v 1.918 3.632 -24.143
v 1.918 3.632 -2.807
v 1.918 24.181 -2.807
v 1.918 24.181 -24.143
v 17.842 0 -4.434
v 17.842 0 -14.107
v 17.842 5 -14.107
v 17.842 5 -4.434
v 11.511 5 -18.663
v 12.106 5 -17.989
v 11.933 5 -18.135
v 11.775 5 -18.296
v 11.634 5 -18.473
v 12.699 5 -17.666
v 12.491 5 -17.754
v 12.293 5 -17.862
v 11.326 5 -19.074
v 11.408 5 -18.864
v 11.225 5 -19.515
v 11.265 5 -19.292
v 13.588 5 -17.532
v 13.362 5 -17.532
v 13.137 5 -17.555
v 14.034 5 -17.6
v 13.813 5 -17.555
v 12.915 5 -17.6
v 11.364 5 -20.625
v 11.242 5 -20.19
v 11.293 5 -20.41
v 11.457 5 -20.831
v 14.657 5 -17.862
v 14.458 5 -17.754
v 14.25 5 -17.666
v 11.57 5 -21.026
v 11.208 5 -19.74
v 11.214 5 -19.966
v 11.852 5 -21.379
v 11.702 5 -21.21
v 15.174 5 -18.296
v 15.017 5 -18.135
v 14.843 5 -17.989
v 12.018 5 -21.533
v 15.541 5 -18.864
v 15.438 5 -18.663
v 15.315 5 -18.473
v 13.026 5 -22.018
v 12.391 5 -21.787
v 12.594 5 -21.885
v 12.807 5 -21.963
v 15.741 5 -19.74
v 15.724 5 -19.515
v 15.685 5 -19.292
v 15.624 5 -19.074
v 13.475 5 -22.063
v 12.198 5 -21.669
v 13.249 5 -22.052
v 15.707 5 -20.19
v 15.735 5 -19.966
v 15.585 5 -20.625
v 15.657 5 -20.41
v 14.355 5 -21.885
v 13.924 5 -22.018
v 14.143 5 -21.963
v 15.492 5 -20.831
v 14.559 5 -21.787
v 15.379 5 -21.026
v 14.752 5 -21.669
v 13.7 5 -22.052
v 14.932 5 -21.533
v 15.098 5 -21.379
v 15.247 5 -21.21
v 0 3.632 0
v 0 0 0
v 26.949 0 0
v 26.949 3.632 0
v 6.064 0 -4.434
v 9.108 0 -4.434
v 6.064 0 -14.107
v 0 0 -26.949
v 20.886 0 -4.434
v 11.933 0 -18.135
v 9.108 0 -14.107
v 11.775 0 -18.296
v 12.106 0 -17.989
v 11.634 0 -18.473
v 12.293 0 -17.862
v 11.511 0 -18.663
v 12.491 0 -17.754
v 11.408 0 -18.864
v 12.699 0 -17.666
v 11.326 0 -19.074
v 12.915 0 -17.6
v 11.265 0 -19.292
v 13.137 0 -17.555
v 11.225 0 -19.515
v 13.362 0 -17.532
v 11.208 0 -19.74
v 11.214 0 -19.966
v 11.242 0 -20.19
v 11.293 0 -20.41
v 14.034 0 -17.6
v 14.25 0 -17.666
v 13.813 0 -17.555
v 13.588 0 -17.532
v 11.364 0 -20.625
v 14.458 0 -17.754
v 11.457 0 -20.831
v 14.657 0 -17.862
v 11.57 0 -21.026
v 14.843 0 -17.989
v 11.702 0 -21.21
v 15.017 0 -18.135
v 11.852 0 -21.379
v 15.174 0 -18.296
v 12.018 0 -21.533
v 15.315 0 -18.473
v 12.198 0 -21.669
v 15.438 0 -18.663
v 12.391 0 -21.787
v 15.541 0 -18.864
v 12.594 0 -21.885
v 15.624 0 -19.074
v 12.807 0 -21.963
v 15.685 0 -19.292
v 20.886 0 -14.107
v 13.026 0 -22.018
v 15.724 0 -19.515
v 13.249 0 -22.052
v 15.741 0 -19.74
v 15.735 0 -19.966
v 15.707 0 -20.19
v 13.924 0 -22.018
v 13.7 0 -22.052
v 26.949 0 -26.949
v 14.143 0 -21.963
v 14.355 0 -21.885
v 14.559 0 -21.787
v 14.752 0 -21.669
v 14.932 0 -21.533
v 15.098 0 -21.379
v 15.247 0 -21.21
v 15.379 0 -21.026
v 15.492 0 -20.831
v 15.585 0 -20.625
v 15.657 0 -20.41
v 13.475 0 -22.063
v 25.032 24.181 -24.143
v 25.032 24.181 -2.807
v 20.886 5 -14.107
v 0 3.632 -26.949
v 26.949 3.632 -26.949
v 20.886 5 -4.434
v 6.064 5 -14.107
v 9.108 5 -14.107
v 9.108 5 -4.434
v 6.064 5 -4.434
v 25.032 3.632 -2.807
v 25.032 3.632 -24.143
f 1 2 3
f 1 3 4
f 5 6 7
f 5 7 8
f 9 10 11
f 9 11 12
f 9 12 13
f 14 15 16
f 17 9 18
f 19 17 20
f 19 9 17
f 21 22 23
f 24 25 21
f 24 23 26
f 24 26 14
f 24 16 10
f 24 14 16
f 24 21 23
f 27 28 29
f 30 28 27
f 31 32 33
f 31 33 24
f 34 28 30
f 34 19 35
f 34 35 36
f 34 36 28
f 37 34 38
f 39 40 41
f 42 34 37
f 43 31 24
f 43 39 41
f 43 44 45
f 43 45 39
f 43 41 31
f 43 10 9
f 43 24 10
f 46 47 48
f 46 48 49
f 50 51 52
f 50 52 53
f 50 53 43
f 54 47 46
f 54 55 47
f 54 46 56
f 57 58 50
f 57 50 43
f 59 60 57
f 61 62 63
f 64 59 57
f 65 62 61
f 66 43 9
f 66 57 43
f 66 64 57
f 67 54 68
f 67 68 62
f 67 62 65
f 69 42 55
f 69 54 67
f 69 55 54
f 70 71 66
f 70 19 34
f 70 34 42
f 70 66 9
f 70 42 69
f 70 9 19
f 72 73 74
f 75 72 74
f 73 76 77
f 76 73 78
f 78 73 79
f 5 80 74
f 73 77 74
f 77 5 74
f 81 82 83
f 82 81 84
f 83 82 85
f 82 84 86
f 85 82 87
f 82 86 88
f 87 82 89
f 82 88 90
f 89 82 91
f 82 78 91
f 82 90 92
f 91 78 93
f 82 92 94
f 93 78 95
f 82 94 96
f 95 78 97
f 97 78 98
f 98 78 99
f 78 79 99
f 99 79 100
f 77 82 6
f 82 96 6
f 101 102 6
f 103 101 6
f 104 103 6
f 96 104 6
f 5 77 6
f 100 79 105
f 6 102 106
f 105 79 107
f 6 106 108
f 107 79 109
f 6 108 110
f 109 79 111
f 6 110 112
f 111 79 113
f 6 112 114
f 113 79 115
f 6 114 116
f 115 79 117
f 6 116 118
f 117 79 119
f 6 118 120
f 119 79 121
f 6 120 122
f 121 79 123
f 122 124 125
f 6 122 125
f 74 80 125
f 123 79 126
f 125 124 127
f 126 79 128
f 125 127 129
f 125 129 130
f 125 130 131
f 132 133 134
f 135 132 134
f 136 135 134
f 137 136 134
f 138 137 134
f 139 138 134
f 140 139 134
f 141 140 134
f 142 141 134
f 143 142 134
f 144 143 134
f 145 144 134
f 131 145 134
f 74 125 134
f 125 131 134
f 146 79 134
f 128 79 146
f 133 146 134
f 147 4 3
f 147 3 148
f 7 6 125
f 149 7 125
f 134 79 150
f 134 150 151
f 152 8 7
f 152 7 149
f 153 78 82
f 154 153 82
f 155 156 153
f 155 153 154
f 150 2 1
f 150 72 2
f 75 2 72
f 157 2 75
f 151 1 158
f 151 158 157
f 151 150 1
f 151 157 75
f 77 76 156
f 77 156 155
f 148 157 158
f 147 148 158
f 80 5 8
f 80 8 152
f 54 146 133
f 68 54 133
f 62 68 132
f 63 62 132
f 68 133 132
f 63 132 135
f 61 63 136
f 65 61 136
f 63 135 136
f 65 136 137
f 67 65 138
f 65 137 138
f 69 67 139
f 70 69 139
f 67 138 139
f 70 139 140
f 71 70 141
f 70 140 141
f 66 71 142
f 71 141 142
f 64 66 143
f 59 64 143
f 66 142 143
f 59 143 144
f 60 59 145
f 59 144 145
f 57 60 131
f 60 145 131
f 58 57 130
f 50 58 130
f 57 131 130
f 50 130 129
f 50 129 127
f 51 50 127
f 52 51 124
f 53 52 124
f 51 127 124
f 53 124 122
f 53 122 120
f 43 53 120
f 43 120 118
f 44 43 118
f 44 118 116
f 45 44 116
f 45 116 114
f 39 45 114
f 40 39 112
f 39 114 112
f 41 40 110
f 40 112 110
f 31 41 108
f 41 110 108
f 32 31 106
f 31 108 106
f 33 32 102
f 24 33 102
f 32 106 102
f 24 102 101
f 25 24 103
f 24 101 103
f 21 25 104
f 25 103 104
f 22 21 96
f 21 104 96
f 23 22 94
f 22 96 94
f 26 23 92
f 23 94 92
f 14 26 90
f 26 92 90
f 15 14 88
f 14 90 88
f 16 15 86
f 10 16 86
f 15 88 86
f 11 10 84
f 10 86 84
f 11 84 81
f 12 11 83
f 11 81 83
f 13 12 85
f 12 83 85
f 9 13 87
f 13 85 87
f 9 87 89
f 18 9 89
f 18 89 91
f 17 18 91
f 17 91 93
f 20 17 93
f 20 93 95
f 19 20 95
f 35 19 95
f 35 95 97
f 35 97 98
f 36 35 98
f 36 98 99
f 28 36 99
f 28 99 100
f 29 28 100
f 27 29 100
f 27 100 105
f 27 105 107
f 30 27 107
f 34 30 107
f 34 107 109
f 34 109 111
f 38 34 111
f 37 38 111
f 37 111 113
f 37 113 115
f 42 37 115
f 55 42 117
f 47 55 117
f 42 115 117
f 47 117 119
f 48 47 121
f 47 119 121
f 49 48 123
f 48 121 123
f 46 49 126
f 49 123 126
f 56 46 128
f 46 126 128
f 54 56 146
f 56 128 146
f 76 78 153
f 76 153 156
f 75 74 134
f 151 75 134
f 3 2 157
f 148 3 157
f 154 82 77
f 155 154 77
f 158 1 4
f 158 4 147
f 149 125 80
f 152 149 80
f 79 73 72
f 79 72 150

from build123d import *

# Parameters (mm, degrees)
SKETCH1_W           = 26.9494
SKETCH1_H           = 26.9494
BOSS_EXTRUDE1_DEPTH = 3.6322
SKETCH2_W           = 23.114
SKETCH2_H           = 21.336
BOSS_EXTRUDE2_DEPTH = 20.5486
SKETCH3_R           = 2.26691968
SKETCH3_W           = 3.044100844
SKETCH3_H           = 9.672621698
CUT_EXTRUDE1_DEPTH  = 5


with BuildPart() as part:
    # Sketch1 → Boss-Extrude1 (new body)
    with BuildSketch(Plane(origin=(0, 0, 0), x_dir=(1, 0, 0), z_dir=(0, 1, 0))):
        with Locations((13.4747, 13.4747)):
            Rectangle(SKETCH1_W, SKETCH1_H)
    extrude(amount=BOSS_EXTRUDE1_DEPTH)

    # Sketch2 → Boss-Extrude2 (add)
    with BuildSketch(Plane(origin=(0, 3.6322, 0), x_dir=(1, 0, 0), z_dir=(0, 1, 0))):
        with Locations((13.4747, 13.4747)):
            Rectangle(SKETCH2_W, SKETCH2_H)
    extrude(amount=BOSS_EXTRUDE2_DEPTH)

    # Sketch3 → Cut-Extrude1 (cut)
    with BuildSketch(Plane.XZ):
        with Locations(Location((13.4747, -19.796472905, 0), (0, 0, 270))):
            Circle(SKETCH3_R)
        with Locations((7.585585607, -9.270512148)):
            Rectangle(SKETCH3_W, SKETCH3_H)
        with Locations((19.363814393, -9.270512148)):
            Rectangle(SKETCH3_W, SKETCH3_H)
    extrude(amount=-CUT_EXTRUDE1_DEPTH, mode=Mode.SUBTRACT)


solid = part.part
